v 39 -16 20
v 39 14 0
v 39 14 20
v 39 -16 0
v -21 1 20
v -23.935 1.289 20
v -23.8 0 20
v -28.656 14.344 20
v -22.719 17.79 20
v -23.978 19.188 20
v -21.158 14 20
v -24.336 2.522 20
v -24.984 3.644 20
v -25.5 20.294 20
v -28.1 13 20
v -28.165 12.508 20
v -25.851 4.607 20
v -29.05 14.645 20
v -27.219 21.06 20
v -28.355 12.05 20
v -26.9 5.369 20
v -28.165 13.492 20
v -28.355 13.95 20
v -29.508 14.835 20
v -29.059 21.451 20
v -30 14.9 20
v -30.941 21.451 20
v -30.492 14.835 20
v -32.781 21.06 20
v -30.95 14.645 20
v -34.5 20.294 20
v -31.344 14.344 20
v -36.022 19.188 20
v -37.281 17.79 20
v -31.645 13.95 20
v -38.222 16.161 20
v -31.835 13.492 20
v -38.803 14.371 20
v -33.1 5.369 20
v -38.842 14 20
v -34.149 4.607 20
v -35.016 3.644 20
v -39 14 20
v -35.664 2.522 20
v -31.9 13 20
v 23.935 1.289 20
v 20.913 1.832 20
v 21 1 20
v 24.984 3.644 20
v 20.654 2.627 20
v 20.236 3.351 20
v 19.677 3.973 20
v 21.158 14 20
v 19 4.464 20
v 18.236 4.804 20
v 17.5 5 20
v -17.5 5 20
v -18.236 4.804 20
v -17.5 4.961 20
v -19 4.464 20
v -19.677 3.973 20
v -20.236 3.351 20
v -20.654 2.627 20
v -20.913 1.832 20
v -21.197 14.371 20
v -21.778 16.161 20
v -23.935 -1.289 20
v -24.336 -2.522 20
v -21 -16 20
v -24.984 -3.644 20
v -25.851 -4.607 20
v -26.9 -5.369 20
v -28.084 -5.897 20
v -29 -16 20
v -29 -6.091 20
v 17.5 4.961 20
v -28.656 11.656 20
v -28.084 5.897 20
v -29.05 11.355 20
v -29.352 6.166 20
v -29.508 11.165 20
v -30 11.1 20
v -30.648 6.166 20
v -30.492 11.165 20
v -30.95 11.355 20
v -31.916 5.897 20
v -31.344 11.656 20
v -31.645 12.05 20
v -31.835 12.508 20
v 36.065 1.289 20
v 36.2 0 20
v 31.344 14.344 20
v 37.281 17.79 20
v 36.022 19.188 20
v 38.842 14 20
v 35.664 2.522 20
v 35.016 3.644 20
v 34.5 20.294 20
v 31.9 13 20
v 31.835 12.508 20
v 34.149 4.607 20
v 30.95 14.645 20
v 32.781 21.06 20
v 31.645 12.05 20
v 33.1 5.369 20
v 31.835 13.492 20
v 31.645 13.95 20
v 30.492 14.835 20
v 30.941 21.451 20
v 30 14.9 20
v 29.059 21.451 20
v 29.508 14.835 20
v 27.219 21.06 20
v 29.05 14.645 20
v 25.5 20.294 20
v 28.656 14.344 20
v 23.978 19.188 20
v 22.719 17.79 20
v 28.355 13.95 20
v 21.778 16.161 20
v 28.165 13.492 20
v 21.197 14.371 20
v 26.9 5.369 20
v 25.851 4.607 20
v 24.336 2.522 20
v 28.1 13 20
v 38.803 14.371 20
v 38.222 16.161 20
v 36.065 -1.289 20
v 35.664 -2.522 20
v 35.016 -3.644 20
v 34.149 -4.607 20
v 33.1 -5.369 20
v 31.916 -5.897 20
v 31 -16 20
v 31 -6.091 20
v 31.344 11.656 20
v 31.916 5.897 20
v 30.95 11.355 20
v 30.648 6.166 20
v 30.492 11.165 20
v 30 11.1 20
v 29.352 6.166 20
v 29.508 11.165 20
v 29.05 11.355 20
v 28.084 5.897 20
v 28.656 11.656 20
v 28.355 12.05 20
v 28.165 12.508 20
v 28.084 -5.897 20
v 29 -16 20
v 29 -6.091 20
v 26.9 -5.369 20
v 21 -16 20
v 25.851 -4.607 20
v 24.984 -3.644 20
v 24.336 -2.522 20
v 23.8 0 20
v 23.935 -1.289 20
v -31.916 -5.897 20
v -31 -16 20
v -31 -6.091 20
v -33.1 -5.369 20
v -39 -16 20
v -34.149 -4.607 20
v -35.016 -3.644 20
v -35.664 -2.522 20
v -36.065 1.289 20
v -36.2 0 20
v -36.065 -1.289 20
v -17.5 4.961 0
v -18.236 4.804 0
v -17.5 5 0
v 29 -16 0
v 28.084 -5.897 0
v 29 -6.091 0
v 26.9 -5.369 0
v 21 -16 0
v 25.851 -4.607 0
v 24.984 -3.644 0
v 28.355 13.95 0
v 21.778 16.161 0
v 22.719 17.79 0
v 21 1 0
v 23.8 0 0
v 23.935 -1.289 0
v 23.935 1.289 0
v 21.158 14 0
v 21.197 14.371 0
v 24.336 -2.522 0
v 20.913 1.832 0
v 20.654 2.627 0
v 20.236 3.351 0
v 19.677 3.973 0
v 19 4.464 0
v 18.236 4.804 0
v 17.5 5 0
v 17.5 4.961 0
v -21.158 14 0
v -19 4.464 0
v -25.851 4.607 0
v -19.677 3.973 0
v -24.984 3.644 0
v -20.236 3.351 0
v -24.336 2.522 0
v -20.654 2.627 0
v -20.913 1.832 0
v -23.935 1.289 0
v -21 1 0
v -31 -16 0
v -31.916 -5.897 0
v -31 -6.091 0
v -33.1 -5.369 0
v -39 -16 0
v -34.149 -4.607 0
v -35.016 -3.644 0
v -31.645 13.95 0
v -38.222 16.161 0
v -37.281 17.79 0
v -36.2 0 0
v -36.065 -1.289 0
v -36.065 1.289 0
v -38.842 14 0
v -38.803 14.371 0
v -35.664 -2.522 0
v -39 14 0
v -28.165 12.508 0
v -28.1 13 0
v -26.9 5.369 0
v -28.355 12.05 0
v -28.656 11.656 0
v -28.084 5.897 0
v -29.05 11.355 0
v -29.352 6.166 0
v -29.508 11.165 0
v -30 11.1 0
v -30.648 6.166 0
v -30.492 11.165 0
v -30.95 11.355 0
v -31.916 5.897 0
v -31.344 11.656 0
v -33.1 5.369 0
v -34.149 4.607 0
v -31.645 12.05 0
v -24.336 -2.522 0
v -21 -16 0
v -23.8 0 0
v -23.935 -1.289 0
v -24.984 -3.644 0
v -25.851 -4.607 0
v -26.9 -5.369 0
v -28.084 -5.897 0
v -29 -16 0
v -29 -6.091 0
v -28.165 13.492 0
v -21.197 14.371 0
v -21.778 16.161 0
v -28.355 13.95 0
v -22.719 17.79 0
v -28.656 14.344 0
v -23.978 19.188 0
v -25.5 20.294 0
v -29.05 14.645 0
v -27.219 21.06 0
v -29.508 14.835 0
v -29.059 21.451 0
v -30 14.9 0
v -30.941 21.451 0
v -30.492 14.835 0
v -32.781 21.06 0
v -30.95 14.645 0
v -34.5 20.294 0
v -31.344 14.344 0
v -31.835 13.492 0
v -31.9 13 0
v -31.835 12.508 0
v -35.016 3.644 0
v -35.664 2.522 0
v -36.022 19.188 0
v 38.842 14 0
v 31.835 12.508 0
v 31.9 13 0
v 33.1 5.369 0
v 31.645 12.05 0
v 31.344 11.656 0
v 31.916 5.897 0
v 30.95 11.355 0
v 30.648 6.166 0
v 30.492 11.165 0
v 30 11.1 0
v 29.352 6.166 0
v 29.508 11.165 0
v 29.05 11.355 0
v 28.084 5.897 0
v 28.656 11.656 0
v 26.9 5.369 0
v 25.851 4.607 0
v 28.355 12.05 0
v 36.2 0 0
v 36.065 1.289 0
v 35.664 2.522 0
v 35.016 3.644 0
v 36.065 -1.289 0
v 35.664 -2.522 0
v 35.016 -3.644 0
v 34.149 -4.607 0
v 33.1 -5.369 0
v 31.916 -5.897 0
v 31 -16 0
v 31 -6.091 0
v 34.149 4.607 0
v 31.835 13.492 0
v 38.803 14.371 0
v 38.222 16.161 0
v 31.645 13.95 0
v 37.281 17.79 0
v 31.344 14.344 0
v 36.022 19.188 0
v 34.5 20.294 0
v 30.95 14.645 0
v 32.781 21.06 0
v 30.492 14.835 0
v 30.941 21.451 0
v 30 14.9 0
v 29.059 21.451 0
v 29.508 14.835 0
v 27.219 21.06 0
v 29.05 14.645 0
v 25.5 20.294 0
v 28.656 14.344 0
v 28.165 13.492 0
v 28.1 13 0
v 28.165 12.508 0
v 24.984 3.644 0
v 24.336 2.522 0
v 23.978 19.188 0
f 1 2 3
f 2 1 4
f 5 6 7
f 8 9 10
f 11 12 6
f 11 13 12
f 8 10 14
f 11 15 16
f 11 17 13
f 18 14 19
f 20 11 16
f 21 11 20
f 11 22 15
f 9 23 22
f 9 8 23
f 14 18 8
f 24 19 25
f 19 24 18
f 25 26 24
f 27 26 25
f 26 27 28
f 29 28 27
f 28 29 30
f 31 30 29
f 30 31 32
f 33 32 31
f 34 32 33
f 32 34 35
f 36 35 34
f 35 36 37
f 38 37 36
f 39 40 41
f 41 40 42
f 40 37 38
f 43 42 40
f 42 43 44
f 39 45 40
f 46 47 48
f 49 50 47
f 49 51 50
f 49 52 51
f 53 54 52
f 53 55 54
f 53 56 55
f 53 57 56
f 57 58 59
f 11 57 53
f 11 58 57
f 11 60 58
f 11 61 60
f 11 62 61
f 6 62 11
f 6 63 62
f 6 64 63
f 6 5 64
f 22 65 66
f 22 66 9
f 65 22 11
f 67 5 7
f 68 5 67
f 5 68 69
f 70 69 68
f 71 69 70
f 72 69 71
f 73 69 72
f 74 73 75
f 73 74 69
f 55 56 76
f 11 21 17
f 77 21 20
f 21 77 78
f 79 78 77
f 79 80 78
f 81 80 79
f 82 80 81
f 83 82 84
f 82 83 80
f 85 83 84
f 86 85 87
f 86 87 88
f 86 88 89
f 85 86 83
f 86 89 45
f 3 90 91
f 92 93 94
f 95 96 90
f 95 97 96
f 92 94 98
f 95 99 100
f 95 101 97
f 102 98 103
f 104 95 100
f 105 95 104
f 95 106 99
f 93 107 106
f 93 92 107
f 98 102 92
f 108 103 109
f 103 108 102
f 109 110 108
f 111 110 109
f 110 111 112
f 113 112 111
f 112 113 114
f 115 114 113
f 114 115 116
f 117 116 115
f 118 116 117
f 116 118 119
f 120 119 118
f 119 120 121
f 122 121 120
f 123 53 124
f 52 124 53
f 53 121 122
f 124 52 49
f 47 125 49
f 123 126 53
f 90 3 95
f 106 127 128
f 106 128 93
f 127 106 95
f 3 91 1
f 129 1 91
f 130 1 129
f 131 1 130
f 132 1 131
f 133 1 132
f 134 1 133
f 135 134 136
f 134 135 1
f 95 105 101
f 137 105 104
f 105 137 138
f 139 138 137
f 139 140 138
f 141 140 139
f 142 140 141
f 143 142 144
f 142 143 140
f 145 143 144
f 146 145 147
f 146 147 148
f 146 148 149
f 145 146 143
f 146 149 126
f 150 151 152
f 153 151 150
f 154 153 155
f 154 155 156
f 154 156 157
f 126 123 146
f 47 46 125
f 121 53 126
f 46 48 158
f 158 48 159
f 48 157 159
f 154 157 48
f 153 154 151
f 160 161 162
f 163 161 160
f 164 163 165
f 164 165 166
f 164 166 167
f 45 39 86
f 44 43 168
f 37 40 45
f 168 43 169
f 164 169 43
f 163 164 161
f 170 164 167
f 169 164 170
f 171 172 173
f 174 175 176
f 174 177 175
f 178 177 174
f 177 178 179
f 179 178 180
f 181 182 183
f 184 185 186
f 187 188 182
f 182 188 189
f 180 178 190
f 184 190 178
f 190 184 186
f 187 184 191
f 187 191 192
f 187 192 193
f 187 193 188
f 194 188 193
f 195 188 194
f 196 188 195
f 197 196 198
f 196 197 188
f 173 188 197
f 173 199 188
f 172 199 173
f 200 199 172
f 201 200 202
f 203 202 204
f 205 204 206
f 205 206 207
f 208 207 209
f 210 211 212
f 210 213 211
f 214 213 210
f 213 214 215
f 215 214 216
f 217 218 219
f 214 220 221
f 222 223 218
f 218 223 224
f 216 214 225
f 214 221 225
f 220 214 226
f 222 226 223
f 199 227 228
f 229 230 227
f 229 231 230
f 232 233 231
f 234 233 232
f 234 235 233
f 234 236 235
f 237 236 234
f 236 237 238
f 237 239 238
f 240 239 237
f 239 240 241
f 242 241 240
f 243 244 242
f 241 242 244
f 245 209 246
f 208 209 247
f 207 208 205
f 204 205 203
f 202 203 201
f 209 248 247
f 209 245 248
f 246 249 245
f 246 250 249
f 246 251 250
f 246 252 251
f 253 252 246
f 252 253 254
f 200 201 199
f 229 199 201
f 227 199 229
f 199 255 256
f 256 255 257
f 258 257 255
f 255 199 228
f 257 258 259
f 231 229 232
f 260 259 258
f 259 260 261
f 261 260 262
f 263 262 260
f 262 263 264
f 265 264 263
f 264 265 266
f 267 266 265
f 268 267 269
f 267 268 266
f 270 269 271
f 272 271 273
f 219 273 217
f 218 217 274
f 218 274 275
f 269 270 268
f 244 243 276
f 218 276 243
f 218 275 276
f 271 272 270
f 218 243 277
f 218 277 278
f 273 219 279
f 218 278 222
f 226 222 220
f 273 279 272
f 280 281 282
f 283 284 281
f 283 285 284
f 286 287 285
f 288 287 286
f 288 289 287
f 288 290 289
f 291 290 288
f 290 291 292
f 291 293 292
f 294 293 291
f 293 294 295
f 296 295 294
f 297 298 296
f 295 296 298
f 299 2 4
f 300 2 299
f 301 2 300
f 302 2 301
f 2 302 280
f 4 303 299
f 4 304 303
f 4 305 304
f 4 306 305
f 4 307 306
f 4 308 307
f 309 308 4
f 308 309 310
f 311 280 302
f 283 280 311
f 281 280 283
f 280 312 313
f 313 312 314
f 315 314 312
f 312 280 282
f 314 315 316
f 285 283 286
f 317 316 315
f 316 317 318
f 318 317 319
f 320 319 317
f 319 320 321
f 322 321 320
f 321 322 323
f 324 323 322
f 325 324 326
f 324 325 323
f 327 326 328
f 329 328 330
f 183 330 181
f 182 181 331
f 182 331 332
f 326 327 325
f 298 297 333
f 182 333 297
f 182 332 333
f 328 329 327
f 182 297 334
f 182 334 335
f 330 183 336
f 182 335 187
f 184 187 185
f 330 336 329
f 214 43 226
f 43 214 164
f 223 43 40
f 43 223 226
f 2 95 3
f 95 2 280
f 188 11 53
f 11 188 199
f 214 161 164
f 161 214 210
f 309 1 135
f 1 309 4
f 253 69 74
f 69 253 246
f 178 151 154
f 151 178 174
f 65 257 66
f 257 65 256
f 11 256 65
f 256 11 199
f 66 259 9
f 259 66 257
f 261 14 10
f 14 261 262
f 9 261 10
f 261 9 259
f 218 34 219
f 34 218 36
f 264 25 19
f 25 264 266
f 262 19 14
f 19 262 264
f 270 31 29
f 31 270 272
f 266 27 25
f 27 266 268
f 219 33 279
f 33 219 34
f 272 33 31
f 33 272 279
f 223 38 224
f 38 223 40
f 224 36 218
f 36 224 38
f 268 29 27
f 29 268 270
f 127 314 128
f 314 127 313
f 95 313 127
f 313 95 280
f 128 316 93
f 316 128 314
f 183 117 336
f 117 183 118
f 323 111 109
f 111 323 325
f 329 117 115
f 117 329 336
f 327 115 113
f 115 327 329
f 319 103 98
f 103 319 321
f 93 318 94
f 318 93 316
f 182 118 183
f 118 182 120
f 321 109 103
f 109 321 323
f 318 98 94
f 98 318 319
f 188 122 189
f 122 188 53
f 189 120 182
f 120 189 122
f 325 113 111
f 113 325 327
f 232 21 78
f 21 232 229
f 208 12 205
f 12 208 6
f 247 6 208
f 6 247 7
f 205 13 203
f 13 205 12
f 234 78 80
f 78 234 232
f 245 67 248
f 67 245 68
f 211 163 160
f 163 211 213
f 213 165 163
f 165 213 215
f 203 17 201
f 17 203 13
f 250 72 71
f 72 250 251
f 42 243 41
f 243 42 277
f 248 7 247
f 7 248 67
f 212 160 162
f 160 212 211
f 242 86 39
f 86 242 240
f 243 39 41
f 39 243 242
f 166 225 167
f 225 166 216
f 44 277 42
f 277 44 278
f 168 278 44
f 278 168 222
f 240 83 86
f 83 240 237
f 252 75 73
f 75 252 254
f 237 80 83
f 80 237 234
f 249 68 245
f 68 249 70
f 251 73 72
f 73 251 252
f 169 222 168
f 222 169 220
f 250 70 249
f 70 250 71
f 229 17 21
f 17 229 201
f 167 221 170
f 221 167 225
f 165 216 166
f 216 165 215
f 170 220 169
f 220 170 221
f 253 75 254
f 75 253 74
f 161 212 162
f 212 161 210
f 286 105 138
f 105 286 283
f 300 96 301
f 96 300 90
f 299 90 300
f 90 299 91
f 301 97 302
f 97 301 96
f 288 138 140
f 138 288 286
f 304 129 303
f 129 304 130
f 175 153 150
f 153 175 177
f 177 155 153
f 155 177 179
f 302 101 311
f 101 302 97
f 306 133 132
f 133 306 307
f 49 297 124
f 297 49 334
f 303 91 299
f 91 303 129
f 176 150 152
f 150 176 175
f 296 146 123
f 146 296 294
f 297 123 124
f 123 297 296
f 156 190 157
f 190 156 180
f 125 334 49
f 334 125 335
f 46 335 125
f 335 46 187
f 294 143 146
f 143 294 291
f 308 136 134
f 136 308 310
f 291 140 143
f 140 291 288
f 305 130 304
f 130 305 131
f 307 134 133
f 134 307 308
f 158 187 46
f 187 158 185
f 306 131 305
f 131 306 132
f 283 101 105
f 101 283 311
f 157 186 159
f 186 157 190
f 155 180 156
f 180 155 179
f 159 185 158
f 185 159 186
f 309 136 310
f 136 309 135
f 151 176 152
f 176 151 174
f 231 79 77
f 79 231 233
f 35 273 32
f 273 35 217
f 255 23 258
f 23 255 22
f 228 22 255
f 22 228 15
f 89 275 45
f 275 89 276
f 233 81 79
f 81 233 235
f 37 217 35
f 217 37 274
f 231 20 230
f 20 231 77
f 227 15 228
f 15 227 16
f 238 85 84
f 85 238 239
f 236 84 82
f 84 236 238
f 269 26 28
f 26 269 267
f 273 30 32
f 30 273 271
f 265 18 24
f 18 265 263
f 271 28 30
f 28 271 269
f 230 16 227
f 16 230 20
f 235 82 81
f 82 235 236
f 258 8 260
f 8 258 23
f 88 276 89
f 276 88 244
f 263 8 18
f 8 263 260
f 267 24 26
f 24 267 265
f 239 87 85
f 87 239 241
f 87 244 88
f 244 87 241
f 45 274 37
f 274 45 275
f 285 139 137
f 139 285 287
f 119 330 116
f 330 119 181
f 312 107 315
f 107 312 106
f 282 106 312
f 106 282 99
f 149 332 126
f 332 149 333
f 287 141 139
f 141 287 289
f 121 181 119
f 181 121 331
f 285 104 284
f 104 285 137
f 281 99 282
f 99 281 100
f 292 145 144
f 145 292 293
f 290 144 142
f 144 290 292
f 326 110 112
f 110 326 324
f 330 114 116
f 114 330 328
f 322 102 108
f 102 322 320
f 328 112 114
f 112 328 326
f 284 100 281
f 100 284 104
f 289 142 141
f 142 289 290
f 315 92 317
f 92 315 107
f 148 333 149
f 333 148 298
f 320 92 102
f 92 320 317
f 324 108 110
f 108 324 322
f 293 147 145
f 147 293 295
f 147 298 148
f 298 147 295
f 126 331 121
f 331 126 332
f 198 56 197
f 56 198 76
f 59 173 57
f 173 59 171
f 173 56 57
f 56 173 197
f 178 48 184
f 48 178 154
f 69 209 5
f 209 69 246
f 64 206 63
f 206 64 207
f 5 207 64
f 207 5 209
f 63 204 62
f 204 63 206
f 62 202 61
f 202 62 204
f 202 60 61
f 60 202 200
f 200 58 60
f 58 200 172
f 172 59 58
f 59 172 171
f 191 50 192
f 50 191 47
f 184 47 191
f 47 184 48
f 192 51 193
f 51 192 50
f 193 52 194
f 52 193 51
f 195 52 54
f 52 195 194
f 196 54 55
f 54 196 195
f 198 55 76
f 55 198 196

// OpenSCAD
// Rostock Bracket from Jcrocholl modified to take 12mm smooth rods by Kolergy
//    - Increase sandwitch mount size & rod mounting slots
//    - Repositioned screws



$fa = 12;
$fs = 0.5;

w = 60; // Smooth rod distance (center to center)

module screws() {
  for (x = [-w/2, w/2]) {
    translate([x, 0, 0]) {
	 // Push-through M3 screw hole.
      translate([0, -10, 0]) rotate([0, 90, 0]) cylinder(r=1.65, h=20, center=true); 
	 // M3 nut holder.
      translate([-x/3.8, -10, 0]) rotate([0, 90, 0]) cylinder(r=3.2, h=2.3, center=true, $fn=6);  //rotate([30, 0, 0]) 
    }
  }
}

module bracket(h) {
  difference() {
    union() {
      translate([   0, -1, 0]) cube([w+18, 30, h], center=true);
      // Sandwich mount.
      translate([-w/2, 12.5, 0]) cylinder(r=9, h=h, center=true);
      translate([ w/2, 12.5, 0]) cylinder(r=9, h=h, center=true);
    }
    // Sandwich mount.
    translate([-w/2, 13, 0]) cylinder(r=1.9, h=h+1, center=true);
    translate([ w/2, 13, 0]) cylinder(r=1.9, h=h+1, center=true);
    // Smooth rod mounting slots.
    for (x = [-w/2, w/2]) {
      translate([x, 0, 0]) {
		cylinder(r=6.2, h=h+1, center=true);
		translate([0, -10, 0]) cube([2, 20, h+1], center=true);
      }
    }
    // Belt path.
    translate([0, -5, 0]) cube([w-25, 20, h+1], center=true);
    translate([0, -9, 0]) cube([w-18, 20, h+1], center=true);
    translate([-w/2+13, 1, 0]) cylinder(r=4, h=h+1, center=true);
    translate([ w/2-13, 1, 0]) cylinder(r=4, h=h+1, center=true);
  }
}

translate([0, 0, 10]) bracket(20);
